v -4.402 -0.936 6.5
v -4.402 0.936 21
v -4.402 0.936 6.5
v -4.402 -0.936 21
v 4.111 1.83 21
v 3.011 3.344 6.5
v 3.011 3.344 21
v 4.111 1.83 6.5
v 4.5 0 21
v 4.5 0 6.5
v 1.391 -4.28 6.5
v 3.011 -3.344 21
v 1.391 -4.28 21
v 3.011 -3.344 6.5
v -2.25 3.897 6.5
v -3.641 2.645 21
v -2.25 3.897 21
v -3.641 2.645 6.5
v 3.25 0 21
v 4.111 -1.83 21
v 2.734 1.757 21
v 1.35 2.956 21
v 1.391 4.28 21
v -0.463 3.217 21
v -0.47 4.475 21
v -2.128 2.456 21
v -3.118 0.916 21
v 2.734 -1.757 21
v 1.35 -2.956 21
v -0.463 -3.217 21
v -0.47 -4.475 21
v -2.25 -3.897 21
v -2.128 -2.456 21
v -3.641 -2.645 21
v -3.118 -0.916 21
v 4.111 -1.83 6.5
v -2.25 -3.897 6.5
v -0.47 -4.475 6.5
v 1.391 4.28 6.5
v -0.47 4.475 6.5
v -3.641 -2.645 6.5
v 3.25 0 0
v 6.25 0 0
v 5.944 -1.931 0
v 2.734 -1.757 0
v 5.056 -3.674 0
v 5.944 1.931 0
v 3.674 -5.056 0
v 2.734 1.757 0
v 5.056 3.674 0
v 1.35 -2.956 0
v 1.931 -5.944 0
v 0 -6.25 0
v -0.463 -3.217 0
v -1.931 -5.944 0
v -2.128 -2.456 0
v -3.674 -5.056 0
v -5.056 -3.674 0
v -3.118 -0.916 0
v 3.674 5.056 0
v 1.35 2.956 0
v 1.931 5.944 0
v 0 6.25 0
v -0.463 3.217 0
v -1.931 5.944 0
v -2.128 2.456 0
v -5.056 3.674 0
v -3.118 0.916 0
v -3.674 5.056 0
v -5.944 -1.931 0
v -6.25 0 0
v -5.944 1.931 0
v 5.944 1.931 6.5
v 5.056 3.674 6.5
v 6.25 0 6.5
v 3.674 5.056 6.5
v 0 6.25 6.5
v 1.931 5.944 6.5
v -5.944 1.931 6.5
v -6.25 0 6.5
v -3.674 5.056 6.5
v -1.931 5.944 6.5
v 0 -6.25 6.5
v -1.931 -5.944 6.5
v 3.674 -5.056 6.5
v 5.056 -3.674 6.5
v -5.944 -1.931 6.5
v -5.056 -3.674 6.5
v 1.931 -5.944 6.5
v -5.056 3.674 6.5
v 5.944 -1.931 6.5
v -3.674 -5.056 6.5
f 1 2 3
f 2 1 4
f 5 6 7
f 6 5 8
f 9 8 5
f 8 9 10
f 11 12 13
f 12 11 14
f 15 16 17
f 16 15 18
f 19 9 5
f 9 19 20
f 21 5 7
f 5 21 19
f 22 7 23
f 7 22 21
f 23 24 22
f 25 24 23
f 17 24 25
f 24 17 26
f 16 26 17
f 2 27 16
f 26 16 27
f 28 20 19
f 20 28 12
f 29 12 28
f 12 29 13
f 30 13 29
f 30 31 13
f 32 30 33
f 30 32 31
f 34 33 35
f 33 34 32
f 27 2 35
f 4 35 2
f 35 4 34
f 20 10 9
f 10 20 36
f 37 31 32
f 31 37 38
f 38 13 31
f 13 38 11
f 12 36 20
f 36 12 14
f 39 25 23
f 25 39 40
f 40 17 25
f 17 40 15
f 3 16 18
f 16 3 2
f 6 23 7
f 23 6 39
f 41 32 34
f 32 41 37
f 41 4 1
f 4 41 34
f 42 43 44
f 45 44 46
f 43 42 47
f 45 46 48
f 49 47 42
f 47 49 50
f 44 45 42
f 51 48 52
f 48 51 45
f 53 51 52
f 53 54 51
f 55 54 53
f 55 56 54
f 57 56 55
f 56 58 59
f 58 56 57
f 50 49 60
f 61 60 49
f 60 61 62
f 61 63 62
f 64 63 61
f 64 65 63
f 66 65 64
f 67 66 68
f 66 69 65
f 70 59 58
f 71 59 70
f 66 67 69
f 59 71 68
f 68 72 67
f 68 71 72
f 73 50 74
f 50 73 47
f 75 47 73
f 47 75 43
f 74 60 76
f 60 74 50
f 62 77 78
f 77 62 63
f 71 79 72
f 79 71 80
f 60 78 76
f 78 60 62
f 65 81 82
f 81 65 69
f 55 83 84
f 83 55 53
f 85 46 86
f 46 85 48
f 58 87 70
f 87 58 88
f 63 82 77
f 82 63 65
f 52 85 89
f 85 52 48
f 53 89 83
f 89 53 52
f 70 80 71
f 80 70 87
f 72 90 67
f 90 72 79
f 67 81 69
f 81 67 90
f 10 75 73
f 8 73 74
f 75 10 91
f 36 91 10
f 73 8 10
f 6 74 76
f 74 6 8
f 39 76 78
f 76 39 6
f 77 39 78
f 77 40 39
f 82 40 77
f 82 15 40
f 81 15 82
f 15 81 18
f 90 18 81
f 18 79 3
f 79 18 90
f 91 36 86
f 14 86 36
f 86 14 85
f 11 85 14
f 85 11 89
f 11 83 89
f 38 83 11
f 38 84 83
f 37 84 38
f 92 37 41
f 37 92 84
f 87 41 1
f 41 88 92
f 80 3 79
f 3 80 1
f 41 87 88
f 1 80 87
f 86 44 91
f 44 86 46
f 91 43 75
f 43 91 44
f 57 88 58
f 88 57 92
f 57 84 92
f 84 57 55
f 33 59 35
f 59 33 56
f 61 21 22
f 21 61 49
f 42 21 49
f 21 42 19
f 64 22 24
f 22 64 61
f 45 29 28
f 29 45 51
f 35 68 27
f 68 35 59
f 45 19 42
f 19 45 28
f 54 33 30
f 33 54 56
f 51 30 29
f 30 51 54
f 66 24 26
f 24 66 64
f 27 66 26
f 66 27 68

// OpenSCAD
include <MCAD/units.scad>

tongue_width = 13; 
tongue_length = 49; 
tongue_height1 = 5;
// tongue_height2 = 26;
tongue_height2 = 19.5;
ball_bump_d = 6.5;
bottom_inset_cyl = ball_bump_d;
speaker_hole = (11/32)*inch; // in
slop=0.2;

debug = 0;



module bootie(){
  difference() {
    union(){ 
      cylinder(d=9, h=21);
      cylinder(d=12.5, h=6.5);
    }
    cylinder(d=6.5, h=22);
  }
}

if (debug == 1) {
  difference() {
  bootie();
  translate([0,0-ball_bump_d,0-.5*slop]) cube([20,69,26]);
  }
} else {
  bootie();
}
